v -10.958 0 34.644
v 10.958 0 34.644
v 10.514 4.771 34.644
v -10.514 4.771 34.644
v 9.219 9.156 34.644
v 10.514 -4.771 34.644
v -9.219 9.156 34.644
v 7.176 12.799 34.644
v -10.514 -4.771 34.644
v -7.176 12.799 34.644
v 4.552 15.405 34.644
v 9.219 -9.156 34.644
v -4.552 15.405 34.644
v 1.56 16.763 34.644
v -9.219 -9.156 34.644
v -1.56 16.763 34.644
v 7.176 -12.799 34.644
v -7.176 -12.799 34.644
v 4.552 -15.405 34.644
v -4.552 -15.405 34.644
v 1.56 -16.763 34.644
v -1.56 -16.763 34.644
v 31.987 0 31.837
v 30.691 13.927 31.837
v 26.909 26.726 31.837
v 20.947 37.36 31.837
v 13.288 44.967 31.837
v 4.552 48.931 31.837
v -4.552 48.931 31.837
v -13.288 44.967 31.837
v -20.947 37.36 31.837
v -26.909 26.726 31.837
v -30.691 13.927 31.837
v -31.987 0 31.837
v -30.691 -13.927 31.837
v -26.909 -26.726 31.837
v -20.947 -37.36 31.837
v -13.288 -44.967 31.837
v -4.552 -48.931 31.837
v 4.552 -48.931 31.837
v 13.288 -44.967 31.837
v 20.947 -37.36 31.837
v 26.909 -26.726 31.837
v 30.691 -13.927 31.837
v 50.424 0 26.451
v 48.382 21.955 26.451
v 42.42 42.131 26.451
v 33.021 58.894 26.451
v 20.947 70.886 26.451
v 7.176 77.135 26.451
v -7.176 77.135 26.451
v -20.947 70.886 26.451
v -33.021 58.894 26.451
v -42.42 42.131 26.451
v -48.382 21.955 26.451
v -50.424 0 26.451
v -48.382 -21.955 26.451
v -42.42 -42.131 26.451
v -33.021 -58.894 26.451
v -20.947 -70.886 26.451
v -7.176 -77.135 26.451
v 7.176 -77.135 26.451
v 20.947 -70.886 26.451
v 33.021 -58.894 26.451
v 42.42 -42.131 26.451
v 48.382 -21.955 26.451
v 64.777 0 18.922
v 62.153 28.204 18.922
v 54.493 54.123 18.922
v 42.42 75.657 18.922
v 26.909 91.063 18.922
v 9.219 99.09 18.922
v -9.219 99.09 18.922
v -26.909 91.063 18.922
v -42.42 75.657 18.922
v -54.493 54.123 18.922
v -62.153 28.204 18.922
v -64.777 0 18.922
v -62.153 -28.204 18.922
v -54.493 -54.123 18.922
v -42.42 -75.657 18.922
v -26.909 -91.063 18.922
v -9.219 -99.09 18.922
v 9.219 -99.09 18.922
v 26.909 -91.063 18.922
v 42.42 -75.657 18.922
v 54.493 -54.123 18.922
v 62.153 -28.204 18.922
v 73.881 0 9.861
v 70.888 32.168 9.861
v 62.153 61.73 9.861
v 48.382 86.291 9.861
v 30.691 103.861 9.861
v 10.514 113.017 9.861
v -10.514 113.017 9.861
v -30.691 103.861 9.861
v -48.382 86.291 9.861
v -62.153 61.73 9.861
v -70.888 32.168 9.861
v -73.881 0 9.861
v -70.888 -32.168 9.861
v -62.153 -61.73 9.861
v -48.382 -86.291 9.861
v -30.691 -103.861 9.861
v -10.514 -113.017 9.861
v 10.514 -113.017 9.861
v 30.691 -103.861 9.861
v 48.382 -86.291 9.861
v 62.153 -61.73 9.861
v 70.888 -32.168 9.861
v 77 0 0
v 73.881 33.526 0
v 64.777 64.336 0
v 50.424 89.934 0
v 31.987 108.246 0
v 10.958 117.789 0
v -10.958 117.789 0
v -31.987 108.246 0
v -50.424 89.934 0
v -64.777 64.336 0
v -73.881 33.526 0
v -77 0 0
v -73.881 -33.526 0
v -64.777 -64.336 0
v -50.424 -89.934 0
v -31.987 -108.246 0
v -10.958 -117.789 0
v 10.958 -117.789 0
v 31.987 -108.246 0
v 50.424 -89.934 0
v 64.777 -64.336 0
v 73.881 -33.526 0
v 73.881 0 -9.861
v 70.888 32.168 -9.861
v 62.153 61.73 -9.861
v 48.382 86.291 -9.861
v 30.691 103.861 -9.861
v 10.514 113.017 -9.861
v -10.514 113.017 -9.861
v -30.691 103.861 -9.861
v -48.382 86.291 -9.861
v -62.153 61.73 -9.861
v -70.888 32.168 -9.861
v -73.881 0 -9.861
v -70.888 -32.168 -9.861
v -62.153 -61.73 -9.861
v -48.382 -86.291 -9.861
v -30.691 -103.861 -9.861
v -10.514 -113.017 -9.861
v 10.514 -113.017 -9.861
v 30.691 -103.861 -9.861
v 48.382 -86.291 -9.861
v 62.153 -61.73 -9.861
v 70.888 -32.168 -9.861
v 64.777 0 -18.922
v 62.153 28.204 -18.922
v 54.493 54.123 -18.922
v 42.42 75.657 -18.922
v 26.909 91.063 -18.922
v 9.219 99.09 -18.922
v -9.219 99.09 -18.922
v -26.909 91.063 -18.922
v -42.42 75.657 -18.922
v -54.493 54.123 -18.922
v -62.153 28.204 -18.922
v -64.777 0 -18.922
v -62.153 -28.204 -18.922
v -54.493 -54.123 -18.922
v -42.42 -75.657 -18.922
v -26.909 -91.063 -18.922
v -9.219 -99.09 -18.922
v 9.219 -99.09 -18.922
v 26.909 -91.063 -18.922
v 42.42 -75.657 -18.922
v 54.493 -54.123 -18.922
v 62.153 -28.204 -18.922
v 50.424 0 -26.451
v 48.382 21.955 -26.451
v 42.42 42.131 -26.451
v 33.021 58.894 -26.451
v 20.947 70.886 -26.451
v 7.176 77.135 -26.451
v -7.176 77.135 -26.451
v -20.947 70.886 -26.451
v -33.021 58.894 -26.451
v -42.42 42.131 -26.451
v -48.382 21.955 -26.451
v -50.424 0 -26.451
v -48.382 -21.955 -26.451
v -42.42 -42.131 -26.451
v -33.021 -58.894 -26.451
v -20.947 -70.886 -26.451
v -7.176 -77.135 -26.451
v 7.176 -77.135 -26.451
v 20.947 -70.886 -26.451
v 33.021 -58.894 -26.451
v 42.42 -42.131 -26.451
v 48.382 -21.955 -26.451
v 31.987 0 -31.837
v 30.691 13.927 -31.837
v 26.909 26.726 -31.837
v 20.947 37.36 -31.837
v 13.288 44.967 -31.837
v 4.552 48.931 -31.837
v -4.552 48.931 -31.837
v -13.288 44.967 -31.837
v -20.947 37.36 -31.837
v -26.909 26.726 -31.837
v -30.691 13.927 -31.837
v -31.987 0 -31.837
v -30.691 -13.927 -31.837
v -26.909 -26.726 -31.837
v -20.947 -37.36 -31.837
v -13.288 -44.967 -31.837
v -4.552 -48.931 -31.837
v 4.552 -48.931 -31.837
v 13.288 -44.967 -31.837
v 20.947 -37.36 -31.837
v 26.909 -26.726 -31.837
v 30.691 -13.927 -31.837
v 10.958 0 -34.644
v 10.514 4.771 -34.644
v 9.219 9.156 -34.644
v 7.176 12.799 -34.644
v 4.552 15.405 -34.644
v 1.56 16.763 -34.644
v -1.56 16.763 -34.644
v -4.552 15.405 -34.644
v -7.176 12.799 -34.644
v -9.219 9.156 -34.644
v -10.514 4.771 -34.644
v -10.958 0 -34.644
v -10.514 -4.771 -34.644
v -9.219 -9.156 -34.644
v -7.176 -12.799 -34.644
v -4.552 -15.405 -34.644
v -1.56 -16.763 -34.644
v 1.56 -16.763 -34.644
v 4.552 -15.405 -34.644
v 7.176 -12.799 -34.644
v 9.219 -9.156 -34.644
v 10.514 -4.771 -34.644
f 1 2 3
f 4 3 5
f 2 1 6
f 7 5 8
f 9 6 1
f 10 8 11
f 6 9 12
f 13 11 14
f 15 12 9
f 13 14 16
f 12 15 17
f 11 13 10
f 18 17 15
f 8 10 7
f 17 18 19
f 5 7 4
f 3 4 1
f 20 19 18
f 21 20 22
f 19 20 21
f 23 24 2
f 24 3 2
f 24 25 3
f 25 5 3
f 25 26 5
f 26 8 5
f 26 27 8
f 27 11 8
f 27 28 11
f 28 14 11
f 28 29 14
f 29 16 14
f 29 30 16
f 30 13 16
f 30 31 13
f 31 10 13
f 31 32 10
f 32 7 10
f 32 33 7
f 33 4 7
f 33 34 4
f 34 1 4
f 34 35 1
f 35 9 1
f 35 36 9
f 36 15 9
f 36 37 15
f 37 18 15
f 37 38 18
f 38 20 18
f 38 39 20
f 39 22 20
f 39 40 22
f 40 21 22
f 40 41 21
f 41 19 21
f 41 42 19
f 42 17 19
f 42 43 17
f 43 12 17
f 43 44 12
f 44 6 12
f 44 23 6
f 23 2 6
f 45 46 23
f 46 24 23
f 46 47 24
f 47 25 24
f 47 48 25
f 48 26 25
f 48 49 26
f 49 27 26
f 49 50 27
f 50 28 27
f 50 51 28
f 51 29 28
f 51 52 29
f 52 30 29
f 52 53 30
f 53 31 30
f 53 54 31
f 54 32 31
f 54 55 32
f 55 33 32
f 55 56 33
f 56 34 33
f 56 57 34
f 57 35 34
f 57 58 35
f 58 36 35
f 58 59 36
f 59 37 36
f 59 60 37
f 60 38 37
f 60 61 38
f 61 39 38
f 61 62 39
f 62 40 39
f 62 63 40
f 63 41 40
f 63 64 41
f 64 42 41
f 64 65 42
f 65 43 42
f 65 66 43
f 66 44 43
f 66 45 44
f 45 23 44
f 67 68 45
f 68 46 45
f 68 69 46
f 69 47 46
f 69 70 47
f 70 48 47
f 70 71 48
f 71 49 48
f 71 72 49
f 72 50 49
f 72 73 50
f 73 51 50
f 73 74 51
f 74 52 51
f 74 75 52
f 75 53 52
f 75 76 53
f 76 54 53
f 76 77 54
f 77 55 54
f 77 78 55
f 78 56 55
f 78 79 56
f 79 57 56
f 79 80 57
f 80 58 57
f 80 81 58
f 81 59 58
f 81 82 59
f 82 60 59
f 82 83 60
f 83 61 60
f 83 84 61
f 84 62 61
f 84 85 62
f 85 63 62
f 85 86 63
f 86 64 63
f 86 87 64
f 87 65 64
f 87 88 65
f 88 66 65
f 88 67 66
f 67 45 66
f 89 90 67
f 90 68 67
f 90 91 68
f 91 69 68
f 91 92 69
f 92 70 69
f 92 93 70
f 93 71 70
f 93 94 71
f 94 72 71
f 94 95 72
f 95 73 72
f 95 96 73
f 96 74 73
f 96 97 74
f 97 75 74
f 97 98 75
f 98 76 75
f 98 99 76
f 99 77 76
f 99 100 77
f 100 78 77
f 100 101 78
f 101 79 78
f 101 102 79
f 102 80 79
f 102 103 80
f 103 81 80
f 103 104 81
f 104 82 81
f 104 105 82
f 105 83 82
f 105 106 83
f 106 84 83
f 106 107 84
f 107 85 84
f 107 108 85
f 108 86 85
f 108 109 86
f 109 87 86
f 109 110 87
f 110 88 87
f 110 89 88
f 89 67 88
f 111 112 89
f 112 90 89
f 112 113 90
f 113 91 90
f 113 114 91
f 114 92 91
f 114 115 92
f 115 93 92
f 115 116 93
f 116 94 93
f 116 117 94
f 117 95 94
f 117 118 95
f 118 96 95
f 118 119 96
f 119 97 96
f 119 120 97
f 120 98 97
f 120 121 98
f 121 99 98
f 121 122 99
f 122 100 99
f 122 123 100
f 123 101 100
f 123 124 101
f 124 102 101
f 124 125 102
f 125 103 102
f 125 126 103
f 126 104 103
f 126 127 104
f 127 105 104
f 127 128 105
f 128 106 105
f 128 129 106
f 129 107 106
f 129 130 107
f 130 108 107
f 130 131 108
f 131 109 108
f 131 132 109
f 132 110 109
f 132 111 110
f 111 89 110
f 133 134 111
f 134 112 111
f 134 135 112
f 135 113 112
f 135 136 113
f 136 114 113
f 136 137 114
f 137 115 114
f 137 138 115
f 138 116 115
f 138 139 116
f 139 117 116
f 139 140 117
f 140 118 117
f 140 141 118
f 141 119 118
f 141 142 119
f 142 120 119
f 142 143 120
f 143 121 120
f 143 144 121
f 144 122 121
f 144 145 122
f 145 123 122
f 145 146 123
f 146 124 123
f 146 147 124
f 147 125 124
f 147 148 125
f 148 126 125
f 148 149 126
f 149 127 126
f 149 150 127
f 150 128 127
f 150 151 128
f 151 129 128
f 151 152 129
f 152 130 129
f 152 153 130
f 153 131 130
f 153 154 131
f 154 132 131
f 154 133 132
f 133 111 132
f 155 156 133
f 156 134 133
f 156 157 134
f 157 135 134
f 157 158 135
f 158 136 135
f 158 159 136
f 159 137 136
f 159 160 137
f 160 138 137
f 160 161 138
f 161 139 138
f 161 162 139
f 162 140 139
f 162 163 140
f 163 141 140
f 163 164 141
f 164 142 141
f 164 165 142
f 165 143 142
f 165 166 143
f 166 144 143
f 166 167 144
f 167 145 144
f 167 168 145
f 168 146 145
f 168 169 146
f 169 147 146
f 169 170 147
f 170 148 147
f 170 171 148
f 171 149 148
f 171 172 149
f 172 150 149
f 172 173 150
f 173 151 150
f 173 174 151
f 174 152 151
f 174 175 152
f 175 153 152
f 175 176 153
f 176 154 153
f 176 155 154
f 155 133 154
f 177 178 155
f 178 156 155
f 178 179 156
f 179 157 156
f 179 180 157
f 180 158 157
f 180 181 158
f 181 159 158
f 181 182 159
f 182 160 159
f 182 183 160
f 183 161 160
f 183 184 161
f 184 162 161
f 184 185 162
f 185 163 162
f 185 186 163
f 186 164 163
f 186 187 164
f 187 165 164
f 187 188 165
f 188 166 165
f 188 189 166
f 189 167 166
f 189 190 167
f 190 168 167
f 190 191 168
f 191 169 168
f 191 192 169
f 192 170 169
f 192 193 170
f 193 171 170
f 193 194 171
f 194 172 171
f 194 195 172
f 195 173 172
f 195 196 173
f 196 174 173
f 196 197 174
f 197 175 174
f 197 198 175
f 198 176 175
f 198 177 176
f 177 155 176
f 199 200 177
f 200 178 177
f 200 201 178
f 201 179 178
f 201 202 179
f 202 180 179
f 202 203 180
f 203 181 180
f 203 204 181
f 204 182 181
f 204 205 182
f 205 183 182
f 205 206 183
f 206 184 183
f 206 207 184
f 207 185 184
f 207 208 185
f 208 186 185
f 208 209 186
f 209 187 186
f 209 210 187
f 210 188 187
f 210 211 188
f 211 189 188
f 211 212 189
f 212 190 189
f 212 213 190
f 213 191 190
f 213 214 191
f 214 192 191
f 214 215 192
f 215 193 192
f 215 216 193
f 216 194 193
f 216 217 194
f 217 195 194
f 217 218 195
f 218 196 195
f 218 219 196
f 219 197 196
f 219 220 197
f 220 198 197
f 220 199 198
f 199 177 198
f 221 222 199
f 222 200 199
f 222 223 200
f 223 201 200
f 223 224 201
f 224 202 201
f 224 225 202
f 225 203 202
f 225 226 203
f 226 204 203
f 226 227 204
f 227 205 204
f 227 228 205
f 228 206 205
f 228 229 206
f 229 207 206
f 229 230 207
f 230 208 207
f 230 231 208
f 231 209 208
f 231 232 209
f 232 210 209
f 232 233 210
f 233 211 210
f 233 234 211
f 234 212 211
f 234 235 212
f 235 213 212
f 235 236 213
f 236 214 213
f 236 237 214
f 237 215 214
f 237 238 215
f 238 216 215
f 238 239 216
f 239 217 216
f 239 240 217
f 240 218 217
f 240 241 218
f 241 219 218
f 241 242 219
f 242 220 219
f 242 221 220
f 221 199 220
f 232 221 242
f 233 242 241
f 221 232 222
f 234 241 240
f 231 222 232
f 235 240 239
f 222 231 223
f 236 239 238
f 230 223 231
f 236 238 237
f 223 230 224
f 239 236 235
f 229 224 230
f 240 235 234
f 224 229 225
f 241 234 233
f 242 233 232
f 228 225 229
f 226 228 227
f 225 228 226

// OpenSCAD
// Generated by SolidPython 1.0.1 on 2020-07-29 00:46:50


scale(v = [11, 17, 5]) {
	sphere(r = 7);
}
/***********************************************
*********      SolidPython code:      **********
************************************************
 
# import packages: SolidPython
from solid import *
from solid.utils import *
from itertools import chain, combinations, permutations


class Resize:

    def __init__(self, scad_file):
        self.scad_file = scad_file
        #self.scad_file = import_scad(scad_file)
        # cone/cylinder param:
        self.r1 = 0
        self.r2 = 0
        self.h = 0
        # rectangular prism param:
        self.w = 0
        self.l = 0
        # ellipse param:
        self.r = 0

    # import OpenScad code (file name corresponds to shape)


    # classify shape + parameters
    def assign(self, param1, param2, param3):
        if self.scad_file == 'cone.scad':
            self.r1 = param1
            self.r2 = param2
            self.h = param3
        elif self.scad_file == 'cylinder.scad':
            self.r1 = param1
            self.r2 = param2
            self.h = param3
        elif self.scad_file == 'rectangularPrism.scad':
            self.h = param1
            self.l = param2
            self.w = param3
        else:
            self.r = param1
            self.h = param2

    # resize parameters
    def iterate(self):
        x = range(3, 20, 2)
        i = 1
        if self.scad_file == 'cone.scad':
            tempList = list(permutations(x, 2))
            for temp in tempList:
                param1 = temp[0]
                param2 = temp[1]
                filepath = 'produced_scad_files/' + 'cone' + str(param1) + '_' + str(param2) + '_' + '.scad'
                scad_render_to_file(cylinder(h=param1, r1=param2, r2=0), filepath)

        elif self.scad_file == 'cylinder.scad':
            tempList = list(permutations(x, 3))
            for temp in tempList:
                param1 = temp[0]
                param2 = temp[1]
                filepath = 'produced_scad_files/' + 'cylinder' + str(param1) + '_' + str(param2) + '_' + '.scad'
                scad_render_to_file(cylinder(h=param1, r1=param2, r2=param2), filepath)

        elif self.scad_file == 'rectangularPrism.scad':
            tempList = list(permutations(x, 3))
            for temp in tempList:
                param1 = temp[0]
                param2 = temp[1]
                param3 = temp[2]
                filepath = 'produced_scad_files/' + 'rectangularPrism' + str(param1) + '_' + str(param2) + '_' + str(
                    param3) + '.scad'
                scad_render_to_file(cube(size=(param1, param2, param3)), filepath)

        elif self.scad_file == 'ellipse.scad':
            tempList = list(permutations(x, 4))
            for temp in tempList:
                param1 = temp[0]
                param2 = temp[1]
                param3 = temp[2]
                param4 = temp[3]
                filepath = 'produced_scad_files/' + 'ellipse' + str(param1) + '_' + str(param2) + '_' + str(param3) + '_' + str(param4) + '.scad'
                scad_render_to_file(scale([param1, param2, param3])(sphere(r=param4)), filepath)

    def render_to_scadfile(self):
        scad_render_to_file(scad, 'example.scad') 
 
************************************************/
